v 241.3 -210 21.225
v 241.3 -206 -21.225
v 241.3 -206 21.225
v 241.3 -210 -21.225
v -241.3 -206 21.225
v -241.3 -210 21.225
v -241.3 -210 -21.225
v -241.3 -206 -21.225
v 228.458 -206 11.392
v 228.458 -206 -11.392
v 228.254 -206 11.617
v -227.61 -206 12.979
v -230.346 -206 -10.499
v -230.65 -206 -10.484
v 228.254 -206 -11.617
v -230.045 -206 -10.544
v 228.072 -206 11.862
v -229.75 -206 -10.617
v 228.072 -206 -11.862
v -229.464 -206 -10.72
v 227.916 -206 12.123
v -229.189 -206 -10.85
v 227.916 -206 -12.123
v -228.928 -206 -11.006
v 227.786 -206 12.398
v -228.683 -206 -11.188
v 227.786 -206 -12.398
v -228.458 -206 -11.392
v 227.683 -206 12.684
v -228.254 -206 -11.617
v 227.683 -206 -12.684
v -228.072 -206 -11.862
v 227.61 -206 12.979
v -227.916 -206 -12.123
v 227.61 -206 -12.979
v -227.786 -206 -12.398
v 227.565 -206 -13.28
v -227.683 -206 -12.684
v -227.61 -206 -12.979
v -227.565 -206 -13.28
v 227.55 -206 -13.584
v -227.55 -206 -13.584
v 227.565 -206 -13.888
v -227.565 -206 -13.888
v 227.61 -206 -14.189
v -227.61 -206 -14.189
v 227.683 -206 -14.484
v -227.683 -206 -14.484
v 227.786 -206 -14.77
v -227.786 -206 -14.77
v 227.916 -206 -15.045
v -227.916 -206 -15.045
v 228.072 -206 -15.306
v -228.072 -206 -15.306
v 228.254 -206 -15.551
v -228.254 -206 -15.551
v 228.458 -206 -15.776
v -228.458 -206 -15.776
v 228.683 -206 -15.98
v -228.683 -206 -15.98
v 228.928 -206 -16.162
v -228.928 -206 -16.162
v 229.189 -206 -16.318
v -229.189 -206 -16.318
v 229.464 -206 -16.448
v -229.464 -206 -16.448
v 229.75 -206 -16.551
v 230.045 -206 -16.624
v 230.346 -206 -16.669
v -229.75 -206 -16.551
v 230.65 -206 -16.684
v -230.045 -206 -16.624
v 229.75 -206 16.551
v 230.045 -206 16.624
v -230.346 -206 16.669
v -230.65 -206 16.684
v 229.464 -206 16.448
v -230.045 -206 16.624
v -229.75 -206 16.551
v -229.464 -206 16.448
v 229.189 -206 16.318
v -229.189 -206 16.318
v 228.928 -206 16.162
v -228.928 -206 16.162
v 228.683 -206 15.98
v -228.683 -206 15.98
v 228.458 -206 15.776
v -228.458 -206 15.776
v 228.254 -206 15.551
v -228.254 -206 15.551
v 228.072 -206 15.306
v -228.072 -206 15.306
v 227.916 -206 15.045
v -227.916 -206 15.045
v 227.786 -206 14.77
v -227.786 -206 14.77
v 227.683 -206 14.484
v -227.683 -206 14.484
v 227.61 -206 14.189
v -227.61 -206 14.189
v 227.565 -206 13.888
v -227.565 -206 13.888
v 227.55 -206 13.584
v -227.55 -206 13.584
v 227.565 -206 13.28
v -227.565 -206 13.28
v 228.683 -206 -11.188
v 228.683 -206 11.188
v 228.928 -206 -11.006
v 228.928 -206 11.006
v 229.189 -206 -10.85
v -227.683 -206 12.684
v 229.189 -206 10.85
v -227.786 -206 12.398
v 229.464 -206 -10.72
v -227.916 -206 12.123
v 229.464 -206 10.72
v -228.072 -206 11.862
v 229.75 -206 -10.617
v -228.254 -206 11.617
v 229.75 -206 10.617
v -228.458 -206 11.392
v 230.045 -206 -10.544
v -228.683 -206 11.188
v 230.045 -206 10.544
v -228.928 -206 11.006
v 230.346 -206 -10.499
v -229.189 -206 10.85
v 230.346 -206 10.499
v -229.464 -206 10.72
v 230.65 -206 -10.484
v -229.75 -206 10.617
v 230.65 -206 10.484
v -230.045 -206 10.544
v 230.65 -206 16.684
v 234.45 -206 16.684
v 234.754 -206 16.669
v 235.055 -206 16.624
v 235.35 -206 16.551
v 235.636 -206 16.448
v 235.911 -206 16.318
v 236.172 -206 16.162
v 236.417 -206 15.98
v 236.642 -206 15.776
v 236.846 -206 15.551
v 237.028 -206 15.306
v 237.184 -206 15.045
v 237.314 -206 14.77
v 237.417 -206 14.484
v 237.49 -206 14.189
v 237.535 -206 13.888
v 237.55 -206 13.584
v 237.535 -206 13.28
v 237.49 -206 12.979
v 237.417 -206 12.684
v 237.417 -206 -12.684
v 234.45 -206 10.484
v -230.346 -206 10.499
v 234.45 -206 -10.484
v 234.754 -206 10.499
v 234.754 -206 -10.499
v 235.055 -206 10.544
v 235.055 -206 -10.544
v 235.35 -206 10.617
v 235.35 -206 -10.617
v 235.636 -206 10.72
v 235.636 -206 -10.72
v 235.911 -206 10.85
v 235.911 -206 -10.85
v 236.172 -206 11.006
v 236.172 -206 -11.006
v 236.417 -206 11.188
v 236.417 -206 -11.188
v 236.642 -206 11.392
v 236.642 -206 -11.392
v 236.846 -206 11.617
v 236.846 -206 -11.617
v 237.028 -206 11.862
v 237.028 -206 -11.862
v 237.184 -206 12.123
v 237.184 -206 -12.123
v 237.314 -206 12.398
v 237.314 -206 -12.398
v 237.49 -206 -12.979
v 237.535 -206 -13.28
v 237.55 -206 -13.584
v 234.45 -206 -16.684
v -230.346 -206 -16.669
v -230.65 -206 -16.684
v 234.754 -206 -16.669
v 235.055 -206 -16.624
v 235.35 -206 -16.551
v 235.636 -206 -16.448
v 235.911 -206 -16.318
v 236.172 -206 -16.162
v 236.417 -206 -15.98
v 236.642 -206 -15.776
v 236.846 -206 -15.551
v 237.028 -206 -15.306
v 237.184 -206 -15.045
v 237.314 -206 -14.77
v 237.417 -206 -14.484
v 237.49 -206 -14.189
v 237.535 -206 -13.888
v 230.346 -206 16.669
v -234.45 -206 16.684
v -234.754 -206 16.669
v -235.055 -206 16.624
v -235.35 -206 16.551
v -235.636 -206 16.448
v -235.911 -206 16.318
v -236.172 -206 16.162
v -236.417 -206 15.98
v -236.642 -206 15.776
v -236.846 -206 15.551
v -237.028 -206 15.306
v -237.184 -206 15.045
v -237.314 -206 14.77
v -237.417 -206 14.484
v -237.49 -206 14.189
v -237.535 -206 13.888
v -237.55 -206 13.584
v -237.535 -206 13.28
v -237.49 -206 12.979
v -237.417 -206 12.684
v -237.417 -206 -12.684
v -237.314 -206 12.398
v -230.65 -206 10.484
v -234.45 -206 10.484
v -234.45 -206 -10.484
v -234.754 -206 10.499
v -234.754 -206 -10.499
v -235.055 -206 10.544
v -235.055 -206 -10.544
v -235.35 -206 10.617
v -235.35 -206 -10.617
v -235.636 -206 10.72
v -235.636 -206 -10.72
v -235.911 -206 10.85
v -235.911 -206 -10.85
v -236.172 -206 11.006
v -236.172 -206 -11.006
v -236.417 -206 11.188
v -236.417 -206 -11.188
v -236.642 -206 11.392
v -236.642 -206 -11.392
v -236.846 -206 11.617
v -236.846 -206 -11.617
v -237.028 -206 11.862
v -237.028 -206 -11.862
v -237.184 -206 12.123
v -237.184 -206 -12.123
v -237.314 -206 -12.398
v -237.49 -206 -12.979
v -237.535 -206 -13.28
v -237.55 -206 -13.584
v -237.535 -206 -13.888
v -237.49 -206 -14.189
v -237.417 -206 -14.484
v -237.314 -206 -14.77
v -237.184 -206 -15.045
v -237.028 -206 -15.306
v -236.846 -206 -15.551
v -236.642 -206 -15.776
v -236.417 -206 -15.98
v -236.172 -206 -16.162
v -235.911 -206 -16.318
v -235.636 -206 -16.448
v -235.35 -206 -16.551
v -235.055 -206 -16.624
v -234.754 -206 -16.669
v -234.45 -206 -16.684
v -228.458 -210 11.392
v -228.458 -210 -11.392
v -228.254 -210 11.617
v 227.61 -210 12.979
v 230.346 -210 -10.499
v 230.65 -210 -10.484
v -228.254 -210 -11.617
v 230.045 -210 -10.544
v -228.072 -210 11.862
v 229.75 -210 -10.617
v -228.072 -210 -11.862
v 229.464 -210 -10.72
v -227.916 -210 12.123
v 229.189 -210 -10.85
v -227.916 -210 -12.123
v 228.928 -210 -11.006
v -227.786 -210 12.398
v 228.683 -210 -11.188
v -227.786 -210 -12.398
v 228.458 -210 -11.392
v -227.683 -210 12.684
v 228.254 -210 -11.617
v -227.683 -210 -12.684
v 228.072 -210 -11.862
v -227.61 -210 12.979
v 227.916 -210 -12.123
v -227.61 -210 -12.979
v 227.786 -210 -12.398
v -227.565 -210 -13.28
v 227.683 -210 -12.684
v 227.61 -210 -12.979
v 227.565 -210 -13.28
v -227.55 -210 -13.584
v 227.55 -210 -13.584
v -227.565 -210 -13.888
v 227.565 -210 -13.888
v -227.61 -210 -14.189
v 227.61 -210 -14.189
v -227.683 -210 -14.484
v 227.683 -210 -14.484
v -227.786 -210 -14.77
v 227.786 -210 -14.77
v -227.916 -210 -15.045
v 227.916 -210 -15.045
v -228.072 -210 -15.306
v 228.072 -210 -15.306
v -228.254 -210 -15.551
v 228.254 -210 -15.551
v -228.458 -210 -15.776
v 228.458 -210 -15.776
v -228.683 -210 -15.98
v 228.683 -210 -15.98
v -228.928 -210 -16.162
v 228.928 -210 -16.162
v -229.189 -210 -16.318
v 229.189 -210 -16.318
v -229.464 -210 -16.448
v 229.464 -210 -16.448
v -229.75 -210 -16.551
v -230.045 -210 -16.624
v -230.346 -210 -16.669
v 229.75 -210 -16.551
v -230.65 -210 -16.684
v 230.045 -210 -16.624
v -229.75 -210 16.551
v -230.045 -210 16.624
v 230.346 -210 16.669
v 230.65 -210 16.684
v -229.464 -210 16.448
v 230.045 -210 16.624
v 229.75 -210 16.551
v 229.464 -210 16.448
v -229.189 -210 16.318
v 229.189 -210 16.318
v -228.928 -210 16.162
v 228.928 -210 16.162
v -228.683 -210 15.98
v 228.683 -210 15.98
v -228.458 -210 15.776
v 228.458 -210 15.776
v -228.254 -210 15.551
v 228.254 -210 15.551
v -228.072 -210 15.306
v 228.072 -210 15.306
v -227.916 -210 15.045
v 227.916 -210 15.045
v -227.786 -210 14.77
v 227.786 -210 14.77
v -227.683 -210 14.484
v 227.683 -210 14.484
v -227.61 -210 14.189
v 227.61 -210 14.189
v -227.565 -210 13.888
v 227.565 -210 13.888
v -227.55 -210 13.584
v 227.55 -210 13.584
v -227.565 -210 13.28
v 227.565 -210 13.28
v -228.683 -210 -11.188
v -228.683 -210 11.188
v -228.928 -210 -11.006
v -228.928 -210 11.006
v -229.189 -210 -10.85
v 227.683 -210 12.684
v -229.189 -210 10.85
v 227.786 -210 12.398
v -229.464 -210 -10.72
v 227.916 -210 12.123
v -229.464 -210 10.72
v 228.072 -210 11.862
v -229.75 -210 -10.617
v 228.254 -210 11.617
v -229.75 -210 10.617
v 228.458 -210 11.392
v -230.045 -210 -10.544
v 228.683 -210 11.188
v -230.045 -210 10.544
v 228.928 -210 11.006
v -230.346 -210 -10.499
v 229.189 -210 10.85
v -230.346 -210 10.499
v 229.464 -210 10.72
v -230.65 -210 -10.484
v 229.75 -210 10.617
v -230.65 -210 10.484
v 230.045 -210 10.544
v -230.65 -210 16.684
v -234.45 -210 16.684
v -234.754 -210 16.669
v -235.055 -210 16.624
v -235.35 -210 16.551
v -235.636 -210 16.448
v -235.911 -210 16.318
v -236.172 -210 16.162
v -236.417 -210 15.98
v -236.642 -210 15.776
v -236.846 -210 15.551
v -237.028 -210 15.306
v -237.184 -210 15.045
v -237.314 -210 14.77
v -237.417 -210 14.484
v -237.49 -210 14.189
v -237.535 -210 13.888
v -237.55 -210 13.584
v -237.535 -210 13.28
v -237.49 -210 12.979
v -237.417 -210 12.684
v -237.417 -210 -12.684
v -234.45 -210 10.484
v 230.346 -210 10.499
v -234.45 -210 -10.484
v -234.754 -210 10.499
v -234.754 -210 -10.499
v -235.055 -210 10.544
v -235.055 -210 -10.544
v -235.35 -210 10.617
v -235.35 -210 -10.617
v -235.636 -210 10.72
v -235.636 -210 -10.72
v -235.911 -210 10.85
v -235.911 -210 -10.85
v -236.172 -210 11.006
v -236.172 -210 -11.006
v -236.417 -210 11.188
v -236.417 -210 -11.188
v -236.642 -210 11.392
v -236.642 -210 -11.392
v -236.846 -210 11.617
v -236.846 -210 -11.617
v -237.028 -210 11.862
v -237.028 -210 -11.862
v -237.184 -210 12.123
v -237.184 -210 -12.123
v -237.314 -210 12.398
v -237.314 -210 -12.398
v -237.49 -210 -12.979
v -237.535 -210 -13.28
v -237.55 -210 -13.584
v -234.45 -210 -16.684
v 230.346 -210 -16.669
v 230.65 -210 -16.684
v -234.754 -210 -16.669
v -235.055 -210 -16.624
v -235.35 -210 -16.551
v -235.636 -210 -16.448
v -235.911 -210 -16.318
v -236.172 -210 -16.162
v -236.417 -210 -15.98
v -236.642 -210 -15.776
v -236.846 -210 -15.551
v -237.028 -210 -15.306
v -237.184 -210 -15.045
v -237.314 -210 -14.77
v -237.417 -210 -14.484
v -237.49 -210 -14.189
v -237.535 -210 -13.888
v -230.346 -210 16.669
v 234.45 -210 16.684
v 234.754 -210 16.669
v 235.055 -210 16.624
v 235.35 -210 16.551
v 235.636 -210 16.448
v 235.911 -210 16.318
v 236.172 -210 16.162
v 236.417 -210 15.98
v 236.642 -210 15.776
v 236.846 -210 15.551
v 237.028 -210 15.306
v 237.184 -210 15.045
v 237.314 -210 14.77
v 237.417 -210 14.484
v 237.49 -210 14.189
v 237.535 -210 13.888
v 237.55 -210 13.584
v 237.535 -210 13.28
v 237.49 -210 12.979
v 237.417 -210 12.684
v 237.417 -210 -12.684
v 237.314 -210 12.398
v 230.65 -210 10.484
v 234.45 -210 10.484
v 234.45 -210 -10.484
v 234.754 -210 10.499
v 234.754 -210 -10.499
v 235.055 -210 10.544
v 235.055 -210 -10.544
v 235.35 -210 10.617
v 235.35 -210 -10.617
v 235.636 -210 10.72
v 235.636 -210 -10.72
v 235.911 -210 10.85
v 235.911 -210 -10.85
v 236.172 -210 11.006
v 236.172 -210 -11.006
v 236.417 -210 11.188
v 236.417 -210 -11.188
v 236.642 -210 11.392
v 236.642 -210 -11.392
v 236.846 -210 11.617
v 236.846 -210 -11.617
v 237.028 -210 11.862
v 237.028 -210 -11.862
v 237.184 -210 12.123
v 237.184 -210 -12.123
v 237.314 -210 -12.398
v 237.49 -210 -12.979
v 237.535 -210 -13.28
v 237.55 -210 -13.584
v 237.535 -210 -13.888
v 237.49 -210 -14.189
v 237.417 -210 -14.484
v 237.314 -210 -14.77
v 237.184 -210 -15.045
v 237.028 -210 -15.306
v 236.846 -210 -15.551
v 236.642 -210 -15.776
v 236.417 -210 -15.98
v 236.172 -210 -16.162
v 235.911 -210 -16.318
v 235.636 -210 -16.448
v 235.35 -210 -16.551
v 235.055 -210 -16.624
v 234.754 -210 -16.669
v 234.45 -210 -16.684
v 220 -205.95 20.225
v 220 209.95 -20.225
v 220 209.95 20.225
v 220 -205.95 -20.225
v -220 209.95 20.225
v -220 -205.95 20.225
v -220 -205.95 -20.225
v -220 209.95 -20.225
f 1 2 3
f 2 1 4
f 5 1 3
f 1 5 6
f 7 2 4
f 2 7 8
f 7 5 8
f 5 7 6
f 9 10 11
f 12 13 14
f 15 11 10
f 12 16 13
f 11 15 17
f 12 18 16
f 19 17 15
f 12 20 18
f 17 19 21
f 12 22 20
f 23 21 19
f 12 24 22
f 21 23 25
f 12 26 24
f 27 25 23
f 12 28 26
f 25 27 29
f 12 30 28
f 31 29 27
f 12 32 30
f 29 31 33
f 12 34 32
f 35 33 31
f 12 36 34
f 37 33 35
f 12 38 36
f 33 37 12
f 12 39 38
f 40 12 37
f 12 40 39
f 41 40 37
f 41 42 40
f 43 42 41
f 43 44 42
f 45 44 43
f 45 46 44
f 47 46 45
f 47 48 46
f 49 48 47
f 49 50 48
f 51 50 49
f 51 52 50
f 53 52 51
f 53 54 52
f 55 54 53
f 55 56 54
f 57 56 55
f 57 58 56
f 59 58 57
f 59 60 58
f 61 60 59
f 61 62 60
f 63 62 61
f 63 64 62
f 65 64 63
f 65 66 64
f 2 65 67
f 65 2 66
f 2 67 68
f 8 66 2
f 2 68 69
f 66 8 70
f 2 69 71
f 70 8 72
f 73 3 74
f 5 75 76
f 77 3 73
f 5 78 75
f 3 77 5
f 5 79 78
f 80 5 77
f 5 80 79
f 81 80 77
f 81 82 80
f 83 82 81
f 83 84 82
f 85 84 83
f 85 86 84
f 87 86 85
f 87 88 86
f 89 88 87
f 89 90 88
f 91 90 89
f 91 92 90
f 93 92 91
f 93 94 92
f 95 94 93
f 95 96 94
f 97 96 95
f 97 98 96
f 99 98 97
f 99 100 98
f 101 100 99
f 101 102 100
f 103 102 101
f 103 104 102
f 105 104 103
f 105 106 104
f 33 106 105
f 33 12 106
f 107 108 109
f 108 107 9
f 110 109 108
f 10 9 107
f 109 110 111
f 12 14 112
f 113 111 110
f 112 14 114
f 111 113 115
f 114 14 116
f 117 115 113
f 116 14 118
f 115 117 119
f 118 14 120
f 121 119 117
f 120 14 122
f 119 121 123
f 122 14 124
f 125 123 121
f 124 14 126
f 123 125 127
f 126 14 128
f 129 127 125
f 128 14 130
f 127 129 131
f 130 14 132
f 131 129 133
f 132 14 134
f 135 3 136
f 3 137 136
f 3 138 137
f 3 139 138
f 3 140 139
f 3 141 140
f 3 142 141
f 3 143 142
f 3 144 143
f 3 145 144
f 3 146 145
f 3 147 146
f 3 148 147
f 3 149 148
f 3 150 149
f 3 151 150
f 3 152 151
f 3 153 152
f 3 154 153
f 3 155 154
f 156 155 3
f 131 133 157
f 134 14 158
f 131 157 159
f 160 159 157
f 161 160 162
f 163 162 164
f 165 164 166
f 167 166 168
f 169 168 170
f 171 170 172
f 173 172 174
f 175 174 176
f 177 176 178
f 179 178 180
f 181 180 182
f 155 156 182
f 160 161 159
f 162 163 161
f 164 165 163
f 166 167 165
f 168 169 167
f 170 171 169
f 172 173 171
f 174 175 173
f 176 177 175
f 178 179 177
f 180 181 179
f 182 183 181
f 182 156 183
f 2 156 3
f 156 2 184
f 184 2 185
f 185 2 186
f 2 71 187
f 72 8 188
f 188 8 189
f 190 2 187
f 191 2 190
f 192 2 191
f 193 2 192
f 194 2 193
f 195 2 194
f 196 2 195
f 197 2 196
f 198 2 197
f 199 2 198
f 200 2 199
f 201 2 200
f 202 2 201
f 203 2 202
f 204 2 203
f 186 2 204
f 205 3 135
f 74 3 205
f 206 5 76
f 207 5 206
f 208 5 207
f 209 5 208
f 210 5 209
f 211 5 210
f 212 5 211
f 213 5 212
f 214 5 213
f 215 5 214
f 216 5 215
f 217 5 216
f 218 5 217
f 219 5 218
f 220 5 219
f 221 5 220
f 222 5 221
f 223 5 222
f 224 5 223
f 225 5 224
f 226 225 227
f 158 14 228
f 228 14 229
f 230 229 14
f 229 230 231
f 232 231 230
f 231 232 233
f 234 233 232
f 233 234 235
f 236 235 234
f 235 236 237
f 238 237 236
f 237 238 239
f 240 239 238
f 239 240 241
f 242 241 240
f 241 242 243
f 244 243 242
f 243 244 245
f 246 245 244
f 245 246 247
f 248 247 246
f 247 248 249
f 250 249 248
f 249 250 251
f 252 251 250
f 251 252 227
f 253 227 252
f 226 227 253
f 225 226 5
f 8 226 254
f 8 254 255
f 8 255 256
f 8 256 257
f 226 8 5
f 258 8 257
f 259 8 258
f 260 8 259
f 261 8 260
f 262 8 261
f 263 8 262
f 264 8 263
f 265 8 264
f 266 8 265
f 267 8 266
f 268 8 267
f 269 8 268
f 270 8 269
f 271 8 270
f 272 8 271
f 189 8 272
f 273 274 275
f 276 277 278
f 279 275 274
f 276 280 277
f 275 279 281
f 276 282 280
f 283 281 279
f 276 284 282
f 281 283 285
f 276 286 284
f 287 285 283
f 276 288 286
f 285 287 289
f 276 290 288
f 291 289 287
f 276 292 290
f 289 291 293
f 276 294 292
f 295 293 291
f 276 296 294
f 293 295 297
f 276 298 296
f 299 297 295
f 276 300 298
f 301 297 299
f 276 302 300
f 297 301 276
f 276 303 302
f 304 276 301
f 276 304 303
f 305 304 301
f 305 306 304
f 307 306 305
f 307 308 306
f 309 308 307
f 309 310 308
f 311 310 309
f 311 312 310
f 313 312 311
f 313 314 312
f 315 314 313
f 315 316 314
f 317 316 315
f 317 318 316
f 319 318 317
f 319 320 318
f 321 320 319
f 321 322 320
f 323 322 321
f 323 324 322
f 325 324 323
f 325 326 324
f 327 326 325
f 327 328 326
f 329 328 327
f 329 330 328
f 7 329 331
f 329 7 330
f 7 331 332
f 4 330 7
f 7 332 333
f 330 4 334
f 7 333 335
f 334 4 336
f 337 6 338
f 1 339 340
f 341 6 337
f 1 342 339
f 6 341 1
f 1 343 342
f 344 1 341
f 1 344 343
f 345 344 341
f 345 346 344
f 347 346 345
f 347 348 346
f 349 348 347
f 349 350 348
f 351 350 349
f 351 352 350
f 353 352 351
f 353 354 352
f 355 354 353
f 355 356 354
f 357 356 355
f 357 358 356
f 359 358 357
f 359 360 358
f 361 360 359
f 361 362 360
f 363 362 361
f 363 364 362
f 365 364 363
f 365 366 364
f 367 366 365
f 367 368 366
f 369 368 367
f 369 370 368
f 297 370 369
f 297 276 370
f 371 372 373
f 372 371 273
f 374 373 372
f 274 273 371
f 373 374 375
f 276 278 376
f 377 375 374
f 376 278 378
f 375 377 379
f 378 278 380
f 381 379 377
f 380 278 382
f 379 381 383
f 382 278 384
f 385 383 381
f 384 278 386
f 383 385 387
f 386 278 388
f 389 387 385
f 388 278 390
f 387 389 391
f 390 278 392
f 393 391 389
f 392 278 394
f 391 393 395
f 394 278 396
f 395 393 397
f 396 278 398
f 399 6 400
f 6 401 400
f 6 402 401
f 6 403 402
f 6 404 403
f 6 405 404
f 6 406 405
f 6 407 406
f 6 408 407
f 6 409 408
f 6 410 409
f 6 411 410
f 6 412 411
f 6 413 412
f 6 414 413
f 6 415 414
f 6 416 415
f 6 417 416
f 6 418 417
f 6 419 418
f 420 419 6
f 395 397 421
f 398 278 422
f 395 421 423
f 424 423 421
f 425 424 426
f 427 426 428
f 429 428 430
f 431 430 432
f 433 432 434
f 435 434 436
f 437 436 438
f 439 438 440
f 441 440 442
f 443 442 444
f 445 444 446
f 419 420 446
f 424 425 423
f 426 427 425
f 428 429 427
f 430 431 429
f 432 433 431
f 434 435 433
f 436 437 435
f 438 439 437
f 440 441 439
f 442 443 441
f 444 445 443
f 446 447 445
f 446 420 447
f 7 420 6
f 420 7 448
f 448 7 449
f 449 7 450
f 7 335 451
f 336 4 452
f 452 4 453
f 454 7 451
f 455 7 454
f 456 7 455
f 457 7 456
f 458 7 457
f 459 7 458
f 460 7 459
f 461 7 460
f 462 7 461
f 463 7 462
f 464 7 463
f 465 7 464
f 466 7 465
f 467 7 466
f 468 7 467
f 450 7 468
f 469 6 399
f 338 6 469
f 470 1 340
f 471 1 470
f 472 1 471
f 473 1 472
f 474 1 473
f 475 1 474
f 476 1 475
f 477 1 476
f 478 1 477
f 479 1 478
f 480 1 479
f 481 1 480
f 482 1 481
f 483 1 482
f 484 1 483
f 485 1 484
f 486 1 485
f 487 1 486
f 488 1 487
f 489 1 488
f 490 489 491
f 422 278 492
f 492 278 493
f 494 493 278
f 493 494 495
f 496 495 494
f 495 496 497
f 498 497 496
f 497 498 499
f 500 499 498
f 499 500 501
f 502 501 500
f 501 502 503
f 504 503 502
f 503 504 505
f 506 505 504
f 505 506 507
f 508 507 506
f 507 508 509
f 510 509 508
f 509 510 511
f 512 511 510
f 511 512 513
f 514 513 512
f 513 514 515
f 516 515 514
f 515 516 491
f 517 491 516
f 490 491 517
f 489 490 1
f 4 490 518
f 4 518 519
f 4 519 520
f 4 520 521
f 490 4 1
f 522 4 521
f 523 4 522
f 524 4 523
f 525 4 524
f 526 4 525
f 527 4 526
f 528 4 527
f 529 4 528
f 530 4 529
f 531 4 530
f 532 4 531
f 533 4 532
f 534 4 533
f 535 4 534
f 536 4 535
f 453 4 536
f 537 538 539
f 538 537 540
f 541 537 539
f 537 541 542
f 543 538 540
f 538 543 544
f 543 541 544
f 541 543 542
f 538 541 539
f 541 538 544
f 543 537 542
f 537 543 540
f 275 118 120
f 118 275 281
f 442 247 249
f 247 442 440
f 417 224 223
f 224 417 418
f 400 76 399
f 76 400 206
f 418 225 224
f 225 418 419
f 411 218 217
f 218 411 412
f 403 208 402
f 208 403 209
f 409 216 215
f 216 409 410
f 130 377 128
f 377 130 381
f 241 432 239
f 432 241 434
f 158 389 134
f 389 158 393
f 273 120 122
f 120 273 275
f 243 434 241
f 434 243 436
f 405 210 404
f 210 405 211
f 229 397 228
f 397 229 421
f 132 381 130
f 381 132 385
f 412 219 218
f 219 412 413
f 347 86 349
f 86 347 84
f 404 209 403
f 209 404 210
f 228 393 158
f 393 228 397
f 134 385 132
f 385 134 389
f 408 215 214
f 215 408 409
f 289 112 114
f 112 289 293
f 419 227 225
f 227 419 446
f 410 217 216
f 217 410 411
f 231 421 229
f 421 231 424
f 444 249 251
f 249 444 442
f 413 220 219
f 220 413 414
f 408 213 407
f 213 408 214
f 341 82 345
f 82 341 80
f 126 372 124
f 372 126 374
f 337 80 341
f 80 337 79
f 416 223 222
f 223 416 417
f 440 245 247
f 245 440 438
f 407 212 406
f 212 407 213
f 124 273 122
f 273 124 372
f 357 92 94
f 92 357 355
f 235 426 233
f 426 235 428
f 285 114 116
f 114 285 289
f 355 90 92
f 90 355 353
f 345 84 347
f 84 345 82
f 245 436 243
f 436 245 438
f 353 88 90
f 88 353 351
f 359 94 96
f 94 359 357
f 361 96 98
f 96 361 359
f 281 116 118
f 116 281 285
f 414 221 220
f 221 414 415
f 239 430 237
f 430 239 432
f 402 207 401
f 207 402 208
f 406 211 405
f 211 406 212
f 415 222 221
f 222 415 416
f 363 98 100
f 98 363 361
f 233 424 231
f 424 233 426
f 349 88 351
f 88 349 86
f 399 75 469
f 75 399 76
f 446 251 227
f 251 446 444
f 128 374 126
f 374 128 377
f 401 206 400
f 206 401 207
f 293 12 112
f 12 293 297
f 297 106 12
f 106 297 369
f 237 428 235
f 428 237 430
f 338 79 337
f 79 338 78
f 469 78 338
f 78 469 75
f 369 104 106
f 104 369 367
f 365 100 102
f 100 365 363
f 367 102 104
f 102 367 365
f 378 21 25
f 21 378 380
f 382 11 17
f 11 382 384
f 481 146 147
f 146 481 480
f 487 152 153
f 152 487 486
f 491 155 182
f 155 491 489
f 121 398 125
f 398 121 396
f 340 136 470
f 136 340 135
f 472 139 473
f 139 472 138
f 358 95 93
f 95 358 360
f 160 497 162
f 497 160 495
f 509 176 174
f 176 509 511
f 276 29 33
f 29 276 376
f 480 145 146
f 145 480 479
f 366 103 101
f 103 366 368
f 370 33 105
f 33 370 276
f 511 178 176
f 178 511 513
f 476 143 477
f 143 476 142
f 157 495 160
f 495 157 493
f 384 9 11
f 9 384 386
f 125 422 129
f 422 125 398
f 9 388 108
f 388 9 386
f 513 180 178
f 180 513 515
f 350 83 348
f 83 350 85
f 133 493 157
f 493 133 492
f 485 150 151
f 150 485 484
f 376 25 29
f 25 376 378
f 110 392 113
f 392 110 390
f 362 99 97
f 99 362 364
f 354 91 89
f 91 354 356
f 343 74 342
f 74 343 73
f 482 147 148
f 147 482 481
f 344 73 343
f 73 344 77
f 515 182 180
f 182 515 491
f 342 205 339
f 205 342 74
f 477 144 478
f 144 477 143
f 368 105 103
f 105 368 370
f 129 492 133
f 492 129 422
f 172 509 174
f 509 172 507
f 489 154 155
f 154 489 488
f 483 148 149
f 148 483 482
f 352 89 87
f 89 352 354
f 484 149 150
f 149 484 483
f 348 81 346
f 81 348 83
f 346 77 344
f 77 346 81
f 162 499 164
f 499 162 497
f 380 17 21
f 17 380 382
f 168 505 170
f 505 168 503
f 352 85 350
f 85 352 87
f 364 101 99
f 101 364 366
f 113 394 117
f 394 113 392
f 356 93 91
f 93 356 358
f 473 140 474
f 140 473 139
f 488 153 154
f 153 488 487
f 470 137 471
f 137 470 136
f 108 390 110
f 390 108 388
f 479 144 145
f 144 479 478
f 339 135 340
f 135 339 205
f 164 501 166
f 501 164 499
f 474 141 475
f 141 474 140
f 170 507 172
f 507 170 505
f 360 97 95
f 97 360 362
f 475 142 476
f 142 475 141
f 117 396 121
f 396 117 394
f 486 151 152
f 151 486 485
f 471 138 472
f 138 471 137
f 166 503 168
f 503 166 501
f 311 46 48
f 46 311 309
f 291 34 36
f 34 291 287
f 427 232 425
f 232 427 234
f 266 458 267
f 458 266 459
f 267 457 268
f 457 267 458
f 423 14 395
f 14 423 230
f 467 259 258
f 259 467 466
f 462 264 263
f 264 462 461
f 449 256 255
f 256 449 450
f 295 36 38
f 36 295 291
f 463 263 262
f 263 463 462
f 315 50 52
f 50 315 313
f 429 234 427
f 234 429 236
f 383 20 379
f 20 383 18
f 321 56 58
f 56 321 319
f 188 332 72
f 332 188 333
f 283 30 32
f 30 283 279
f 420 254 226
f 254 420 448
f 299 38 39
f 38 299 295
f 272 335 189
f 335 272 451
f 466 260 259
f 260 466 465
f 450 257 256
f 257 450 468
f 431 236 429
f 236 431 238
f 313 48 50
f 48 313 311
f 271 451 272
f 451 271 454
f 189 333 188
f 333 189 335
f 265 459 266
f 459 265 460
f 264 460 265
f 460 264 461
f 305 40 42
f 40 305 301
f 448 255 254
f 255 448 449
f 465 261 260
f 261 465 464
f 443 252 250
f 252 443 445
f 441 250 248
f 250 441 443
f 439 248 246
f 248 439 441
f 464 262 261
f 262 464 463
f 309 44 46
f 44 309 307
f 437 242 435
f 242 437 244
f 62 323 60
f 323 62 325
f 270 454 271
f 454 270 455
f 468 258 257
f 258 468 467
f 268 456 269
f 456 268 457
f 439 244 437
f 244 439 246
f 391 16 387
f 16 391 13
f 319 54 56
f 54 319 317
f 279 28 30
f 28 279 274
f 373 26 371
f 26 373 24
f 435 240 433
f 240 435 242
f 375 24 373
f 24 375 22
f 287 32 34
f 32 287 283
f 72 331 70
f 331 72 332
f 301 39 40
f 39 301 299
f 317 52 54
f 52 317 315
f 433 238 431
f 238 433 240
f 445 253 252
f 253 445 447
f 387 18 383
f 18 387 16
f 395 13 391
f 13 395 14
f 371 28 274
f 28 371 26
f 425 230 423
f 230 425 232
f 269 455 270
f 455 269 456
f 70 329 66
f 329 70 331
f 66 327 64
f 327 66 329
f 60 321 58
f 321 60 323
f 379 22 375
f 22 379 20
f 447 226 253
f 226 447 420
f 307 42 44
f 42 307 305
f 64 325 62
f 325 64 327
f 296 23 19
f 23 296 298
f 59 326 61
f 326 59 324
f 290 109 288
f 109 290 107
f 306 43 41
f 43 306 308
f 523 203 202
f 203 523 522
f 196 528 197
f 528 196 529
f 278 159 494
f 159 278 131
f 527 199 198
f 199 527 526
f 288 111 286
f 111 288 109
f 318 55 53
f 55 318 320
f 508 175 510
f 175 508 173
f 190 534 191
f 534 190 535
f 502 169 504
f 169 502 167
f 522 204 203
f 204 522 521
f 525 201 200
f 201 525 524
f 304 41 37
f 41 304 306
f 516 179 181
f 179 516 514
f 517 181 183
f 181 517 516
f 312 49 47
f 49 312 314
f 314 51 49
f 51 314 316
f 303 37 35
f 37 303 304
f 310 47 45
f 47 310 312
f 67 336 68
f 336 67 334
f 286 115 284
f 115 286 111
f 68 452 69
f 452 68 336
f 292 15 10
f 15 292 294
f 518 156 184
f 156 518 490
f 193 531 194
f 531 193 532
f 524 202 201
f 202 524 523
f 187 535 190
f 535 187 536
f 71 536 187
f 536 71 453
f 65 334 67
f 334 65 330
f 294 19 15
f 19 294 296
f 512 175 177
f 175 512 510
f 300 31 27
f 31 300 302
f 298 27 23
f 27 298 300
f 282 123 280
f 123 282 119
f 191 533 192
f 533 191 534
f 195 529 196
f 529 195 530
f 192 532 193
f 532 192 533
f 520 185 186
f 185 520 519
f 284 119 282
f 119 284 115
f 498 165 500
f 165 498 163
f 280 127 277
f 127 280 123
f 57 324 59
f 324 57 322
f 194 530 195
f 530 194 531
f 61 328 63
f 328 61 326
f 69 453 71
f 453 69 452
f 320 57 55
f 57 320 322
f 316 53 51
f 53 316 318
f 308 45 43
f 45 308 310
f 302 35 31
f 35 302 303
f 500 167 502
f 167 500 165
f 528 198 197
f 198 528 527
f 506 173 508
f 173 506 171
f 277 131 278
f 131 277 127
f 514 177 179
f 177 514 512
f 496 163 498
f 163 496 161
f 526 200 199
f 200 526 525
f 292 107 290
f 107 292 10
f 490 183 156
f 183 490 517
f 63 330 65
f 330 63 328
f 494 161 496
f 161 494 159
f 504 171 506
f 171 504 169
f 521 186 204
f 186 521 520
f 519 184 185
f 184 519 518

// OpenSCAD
// ============================================================================
// Atom Lithography Machine — Parametric OpenSCAD Module (S7.4-04)
// ============================================================================
// part_id           : S7.4-04
// parent_bom_id     : S7.4
// subsystem         : S7
// part_name         : Makine guvenlik kilidi PLC (UHV, HV, PH3 gaz, kriyo quench acil-dur)
// material          : Steel
// temp_stage        : 300 K (kabin)
// vacuum_grade      : Atmosfer
// tolerance         : <10 ms kesme
// computed_mass_kg  : 9.80000
// envelope_mm       : 482.600 x 443.300 x 42.450
// design_maturity   : M0_M1_DETAILED_CAD_DESIGN_ONLY
// no_lab_measurement: true
// iec61508_certified: false
// semi_s2_certified : false
// Units: millimeters (mm)
// ============================================================================

$fn = 64;

// Nominal bounding envelope parameters (mm)
bbox_x = 482.6000;
bbox_y = 443.3000;
bbox_z = 42.4500;

// Part-specific parametric dimensions
u_start = 38;
u_count = 1;
depth_mm = 420.0;

// Interface / port parameters (mm)

module part_S7_4_04() {
  difference() {
    union() {
      // 19-inch EIA-310 front faceplate
      translate([0.000, -208.000, 0.000]) cube([482.600, 4.000, 42.450], center=true);
      // Main rack chassis enclosure
      translate([0.000, 2.000, 0.000]) cube([440.000, 415.900, 40.450], center=true);
    }
    // EIA-310 rack ear mounting slot (top-left)
    translate([-232.550, -208.000, 13.584]) rotate([90.000, 0.000, 0.000]) {
      hull() {
        translate([-1.900, 0, 0]) cylinder(d=6.200, h=8.000, center=true);
        translate([1.900, 0, 0]) cylinder(d=6.200, h=8.000, center=true);
      }
    }
    // EIA-310 rack ear mounting slot (top-right)
    translate([232.550, -208.000, 13.584]) rotate([90.000, 0.000, 0.000]) {
      hull() {
        translate([-1.900, 0, 0]) cylinder(d=6.200, h=8.000, center=true);
        translate([1.900, 0, 0]) cylinder(d=6.200, h=8.000, center=true);
      }
    }
    // EIA-310 rack ear mounting slot (bottom-left)
    translate([-232.550, -208.000, -13.584]) rotate([90.000, 0.000, 0.000]) {
      hull() {
        translate([-1.900, 0, 0]) cylinder(d=6.200, h=8.000, center=true);
        translate([1.900, 0, 0]) cylinder(d=6.200, h=8.000, center=true);
      }
    }
    // EIA-310 rack ear mounting slot (bottom-right)
    translate([232.550, -208.000, -13.584]) rotate([90.000, 0.000, 0.000]) {
      hull() {
        translate([-1.900, 0, 0]) cylinder(d=6.200, h=8.000, center=true);
        translate([1.900, 0, 0]) cylinder(d=6.200, h=8.000, center=true);
      }
    }
  }
}

// World assembly mounting transform (global machine frame, mm / deg):
// translate([1480.000, -228.000, 1756.875]) rotate([0.000, 0.000, 0.000]) part_S7_4_04();

part_S7_4_04();
